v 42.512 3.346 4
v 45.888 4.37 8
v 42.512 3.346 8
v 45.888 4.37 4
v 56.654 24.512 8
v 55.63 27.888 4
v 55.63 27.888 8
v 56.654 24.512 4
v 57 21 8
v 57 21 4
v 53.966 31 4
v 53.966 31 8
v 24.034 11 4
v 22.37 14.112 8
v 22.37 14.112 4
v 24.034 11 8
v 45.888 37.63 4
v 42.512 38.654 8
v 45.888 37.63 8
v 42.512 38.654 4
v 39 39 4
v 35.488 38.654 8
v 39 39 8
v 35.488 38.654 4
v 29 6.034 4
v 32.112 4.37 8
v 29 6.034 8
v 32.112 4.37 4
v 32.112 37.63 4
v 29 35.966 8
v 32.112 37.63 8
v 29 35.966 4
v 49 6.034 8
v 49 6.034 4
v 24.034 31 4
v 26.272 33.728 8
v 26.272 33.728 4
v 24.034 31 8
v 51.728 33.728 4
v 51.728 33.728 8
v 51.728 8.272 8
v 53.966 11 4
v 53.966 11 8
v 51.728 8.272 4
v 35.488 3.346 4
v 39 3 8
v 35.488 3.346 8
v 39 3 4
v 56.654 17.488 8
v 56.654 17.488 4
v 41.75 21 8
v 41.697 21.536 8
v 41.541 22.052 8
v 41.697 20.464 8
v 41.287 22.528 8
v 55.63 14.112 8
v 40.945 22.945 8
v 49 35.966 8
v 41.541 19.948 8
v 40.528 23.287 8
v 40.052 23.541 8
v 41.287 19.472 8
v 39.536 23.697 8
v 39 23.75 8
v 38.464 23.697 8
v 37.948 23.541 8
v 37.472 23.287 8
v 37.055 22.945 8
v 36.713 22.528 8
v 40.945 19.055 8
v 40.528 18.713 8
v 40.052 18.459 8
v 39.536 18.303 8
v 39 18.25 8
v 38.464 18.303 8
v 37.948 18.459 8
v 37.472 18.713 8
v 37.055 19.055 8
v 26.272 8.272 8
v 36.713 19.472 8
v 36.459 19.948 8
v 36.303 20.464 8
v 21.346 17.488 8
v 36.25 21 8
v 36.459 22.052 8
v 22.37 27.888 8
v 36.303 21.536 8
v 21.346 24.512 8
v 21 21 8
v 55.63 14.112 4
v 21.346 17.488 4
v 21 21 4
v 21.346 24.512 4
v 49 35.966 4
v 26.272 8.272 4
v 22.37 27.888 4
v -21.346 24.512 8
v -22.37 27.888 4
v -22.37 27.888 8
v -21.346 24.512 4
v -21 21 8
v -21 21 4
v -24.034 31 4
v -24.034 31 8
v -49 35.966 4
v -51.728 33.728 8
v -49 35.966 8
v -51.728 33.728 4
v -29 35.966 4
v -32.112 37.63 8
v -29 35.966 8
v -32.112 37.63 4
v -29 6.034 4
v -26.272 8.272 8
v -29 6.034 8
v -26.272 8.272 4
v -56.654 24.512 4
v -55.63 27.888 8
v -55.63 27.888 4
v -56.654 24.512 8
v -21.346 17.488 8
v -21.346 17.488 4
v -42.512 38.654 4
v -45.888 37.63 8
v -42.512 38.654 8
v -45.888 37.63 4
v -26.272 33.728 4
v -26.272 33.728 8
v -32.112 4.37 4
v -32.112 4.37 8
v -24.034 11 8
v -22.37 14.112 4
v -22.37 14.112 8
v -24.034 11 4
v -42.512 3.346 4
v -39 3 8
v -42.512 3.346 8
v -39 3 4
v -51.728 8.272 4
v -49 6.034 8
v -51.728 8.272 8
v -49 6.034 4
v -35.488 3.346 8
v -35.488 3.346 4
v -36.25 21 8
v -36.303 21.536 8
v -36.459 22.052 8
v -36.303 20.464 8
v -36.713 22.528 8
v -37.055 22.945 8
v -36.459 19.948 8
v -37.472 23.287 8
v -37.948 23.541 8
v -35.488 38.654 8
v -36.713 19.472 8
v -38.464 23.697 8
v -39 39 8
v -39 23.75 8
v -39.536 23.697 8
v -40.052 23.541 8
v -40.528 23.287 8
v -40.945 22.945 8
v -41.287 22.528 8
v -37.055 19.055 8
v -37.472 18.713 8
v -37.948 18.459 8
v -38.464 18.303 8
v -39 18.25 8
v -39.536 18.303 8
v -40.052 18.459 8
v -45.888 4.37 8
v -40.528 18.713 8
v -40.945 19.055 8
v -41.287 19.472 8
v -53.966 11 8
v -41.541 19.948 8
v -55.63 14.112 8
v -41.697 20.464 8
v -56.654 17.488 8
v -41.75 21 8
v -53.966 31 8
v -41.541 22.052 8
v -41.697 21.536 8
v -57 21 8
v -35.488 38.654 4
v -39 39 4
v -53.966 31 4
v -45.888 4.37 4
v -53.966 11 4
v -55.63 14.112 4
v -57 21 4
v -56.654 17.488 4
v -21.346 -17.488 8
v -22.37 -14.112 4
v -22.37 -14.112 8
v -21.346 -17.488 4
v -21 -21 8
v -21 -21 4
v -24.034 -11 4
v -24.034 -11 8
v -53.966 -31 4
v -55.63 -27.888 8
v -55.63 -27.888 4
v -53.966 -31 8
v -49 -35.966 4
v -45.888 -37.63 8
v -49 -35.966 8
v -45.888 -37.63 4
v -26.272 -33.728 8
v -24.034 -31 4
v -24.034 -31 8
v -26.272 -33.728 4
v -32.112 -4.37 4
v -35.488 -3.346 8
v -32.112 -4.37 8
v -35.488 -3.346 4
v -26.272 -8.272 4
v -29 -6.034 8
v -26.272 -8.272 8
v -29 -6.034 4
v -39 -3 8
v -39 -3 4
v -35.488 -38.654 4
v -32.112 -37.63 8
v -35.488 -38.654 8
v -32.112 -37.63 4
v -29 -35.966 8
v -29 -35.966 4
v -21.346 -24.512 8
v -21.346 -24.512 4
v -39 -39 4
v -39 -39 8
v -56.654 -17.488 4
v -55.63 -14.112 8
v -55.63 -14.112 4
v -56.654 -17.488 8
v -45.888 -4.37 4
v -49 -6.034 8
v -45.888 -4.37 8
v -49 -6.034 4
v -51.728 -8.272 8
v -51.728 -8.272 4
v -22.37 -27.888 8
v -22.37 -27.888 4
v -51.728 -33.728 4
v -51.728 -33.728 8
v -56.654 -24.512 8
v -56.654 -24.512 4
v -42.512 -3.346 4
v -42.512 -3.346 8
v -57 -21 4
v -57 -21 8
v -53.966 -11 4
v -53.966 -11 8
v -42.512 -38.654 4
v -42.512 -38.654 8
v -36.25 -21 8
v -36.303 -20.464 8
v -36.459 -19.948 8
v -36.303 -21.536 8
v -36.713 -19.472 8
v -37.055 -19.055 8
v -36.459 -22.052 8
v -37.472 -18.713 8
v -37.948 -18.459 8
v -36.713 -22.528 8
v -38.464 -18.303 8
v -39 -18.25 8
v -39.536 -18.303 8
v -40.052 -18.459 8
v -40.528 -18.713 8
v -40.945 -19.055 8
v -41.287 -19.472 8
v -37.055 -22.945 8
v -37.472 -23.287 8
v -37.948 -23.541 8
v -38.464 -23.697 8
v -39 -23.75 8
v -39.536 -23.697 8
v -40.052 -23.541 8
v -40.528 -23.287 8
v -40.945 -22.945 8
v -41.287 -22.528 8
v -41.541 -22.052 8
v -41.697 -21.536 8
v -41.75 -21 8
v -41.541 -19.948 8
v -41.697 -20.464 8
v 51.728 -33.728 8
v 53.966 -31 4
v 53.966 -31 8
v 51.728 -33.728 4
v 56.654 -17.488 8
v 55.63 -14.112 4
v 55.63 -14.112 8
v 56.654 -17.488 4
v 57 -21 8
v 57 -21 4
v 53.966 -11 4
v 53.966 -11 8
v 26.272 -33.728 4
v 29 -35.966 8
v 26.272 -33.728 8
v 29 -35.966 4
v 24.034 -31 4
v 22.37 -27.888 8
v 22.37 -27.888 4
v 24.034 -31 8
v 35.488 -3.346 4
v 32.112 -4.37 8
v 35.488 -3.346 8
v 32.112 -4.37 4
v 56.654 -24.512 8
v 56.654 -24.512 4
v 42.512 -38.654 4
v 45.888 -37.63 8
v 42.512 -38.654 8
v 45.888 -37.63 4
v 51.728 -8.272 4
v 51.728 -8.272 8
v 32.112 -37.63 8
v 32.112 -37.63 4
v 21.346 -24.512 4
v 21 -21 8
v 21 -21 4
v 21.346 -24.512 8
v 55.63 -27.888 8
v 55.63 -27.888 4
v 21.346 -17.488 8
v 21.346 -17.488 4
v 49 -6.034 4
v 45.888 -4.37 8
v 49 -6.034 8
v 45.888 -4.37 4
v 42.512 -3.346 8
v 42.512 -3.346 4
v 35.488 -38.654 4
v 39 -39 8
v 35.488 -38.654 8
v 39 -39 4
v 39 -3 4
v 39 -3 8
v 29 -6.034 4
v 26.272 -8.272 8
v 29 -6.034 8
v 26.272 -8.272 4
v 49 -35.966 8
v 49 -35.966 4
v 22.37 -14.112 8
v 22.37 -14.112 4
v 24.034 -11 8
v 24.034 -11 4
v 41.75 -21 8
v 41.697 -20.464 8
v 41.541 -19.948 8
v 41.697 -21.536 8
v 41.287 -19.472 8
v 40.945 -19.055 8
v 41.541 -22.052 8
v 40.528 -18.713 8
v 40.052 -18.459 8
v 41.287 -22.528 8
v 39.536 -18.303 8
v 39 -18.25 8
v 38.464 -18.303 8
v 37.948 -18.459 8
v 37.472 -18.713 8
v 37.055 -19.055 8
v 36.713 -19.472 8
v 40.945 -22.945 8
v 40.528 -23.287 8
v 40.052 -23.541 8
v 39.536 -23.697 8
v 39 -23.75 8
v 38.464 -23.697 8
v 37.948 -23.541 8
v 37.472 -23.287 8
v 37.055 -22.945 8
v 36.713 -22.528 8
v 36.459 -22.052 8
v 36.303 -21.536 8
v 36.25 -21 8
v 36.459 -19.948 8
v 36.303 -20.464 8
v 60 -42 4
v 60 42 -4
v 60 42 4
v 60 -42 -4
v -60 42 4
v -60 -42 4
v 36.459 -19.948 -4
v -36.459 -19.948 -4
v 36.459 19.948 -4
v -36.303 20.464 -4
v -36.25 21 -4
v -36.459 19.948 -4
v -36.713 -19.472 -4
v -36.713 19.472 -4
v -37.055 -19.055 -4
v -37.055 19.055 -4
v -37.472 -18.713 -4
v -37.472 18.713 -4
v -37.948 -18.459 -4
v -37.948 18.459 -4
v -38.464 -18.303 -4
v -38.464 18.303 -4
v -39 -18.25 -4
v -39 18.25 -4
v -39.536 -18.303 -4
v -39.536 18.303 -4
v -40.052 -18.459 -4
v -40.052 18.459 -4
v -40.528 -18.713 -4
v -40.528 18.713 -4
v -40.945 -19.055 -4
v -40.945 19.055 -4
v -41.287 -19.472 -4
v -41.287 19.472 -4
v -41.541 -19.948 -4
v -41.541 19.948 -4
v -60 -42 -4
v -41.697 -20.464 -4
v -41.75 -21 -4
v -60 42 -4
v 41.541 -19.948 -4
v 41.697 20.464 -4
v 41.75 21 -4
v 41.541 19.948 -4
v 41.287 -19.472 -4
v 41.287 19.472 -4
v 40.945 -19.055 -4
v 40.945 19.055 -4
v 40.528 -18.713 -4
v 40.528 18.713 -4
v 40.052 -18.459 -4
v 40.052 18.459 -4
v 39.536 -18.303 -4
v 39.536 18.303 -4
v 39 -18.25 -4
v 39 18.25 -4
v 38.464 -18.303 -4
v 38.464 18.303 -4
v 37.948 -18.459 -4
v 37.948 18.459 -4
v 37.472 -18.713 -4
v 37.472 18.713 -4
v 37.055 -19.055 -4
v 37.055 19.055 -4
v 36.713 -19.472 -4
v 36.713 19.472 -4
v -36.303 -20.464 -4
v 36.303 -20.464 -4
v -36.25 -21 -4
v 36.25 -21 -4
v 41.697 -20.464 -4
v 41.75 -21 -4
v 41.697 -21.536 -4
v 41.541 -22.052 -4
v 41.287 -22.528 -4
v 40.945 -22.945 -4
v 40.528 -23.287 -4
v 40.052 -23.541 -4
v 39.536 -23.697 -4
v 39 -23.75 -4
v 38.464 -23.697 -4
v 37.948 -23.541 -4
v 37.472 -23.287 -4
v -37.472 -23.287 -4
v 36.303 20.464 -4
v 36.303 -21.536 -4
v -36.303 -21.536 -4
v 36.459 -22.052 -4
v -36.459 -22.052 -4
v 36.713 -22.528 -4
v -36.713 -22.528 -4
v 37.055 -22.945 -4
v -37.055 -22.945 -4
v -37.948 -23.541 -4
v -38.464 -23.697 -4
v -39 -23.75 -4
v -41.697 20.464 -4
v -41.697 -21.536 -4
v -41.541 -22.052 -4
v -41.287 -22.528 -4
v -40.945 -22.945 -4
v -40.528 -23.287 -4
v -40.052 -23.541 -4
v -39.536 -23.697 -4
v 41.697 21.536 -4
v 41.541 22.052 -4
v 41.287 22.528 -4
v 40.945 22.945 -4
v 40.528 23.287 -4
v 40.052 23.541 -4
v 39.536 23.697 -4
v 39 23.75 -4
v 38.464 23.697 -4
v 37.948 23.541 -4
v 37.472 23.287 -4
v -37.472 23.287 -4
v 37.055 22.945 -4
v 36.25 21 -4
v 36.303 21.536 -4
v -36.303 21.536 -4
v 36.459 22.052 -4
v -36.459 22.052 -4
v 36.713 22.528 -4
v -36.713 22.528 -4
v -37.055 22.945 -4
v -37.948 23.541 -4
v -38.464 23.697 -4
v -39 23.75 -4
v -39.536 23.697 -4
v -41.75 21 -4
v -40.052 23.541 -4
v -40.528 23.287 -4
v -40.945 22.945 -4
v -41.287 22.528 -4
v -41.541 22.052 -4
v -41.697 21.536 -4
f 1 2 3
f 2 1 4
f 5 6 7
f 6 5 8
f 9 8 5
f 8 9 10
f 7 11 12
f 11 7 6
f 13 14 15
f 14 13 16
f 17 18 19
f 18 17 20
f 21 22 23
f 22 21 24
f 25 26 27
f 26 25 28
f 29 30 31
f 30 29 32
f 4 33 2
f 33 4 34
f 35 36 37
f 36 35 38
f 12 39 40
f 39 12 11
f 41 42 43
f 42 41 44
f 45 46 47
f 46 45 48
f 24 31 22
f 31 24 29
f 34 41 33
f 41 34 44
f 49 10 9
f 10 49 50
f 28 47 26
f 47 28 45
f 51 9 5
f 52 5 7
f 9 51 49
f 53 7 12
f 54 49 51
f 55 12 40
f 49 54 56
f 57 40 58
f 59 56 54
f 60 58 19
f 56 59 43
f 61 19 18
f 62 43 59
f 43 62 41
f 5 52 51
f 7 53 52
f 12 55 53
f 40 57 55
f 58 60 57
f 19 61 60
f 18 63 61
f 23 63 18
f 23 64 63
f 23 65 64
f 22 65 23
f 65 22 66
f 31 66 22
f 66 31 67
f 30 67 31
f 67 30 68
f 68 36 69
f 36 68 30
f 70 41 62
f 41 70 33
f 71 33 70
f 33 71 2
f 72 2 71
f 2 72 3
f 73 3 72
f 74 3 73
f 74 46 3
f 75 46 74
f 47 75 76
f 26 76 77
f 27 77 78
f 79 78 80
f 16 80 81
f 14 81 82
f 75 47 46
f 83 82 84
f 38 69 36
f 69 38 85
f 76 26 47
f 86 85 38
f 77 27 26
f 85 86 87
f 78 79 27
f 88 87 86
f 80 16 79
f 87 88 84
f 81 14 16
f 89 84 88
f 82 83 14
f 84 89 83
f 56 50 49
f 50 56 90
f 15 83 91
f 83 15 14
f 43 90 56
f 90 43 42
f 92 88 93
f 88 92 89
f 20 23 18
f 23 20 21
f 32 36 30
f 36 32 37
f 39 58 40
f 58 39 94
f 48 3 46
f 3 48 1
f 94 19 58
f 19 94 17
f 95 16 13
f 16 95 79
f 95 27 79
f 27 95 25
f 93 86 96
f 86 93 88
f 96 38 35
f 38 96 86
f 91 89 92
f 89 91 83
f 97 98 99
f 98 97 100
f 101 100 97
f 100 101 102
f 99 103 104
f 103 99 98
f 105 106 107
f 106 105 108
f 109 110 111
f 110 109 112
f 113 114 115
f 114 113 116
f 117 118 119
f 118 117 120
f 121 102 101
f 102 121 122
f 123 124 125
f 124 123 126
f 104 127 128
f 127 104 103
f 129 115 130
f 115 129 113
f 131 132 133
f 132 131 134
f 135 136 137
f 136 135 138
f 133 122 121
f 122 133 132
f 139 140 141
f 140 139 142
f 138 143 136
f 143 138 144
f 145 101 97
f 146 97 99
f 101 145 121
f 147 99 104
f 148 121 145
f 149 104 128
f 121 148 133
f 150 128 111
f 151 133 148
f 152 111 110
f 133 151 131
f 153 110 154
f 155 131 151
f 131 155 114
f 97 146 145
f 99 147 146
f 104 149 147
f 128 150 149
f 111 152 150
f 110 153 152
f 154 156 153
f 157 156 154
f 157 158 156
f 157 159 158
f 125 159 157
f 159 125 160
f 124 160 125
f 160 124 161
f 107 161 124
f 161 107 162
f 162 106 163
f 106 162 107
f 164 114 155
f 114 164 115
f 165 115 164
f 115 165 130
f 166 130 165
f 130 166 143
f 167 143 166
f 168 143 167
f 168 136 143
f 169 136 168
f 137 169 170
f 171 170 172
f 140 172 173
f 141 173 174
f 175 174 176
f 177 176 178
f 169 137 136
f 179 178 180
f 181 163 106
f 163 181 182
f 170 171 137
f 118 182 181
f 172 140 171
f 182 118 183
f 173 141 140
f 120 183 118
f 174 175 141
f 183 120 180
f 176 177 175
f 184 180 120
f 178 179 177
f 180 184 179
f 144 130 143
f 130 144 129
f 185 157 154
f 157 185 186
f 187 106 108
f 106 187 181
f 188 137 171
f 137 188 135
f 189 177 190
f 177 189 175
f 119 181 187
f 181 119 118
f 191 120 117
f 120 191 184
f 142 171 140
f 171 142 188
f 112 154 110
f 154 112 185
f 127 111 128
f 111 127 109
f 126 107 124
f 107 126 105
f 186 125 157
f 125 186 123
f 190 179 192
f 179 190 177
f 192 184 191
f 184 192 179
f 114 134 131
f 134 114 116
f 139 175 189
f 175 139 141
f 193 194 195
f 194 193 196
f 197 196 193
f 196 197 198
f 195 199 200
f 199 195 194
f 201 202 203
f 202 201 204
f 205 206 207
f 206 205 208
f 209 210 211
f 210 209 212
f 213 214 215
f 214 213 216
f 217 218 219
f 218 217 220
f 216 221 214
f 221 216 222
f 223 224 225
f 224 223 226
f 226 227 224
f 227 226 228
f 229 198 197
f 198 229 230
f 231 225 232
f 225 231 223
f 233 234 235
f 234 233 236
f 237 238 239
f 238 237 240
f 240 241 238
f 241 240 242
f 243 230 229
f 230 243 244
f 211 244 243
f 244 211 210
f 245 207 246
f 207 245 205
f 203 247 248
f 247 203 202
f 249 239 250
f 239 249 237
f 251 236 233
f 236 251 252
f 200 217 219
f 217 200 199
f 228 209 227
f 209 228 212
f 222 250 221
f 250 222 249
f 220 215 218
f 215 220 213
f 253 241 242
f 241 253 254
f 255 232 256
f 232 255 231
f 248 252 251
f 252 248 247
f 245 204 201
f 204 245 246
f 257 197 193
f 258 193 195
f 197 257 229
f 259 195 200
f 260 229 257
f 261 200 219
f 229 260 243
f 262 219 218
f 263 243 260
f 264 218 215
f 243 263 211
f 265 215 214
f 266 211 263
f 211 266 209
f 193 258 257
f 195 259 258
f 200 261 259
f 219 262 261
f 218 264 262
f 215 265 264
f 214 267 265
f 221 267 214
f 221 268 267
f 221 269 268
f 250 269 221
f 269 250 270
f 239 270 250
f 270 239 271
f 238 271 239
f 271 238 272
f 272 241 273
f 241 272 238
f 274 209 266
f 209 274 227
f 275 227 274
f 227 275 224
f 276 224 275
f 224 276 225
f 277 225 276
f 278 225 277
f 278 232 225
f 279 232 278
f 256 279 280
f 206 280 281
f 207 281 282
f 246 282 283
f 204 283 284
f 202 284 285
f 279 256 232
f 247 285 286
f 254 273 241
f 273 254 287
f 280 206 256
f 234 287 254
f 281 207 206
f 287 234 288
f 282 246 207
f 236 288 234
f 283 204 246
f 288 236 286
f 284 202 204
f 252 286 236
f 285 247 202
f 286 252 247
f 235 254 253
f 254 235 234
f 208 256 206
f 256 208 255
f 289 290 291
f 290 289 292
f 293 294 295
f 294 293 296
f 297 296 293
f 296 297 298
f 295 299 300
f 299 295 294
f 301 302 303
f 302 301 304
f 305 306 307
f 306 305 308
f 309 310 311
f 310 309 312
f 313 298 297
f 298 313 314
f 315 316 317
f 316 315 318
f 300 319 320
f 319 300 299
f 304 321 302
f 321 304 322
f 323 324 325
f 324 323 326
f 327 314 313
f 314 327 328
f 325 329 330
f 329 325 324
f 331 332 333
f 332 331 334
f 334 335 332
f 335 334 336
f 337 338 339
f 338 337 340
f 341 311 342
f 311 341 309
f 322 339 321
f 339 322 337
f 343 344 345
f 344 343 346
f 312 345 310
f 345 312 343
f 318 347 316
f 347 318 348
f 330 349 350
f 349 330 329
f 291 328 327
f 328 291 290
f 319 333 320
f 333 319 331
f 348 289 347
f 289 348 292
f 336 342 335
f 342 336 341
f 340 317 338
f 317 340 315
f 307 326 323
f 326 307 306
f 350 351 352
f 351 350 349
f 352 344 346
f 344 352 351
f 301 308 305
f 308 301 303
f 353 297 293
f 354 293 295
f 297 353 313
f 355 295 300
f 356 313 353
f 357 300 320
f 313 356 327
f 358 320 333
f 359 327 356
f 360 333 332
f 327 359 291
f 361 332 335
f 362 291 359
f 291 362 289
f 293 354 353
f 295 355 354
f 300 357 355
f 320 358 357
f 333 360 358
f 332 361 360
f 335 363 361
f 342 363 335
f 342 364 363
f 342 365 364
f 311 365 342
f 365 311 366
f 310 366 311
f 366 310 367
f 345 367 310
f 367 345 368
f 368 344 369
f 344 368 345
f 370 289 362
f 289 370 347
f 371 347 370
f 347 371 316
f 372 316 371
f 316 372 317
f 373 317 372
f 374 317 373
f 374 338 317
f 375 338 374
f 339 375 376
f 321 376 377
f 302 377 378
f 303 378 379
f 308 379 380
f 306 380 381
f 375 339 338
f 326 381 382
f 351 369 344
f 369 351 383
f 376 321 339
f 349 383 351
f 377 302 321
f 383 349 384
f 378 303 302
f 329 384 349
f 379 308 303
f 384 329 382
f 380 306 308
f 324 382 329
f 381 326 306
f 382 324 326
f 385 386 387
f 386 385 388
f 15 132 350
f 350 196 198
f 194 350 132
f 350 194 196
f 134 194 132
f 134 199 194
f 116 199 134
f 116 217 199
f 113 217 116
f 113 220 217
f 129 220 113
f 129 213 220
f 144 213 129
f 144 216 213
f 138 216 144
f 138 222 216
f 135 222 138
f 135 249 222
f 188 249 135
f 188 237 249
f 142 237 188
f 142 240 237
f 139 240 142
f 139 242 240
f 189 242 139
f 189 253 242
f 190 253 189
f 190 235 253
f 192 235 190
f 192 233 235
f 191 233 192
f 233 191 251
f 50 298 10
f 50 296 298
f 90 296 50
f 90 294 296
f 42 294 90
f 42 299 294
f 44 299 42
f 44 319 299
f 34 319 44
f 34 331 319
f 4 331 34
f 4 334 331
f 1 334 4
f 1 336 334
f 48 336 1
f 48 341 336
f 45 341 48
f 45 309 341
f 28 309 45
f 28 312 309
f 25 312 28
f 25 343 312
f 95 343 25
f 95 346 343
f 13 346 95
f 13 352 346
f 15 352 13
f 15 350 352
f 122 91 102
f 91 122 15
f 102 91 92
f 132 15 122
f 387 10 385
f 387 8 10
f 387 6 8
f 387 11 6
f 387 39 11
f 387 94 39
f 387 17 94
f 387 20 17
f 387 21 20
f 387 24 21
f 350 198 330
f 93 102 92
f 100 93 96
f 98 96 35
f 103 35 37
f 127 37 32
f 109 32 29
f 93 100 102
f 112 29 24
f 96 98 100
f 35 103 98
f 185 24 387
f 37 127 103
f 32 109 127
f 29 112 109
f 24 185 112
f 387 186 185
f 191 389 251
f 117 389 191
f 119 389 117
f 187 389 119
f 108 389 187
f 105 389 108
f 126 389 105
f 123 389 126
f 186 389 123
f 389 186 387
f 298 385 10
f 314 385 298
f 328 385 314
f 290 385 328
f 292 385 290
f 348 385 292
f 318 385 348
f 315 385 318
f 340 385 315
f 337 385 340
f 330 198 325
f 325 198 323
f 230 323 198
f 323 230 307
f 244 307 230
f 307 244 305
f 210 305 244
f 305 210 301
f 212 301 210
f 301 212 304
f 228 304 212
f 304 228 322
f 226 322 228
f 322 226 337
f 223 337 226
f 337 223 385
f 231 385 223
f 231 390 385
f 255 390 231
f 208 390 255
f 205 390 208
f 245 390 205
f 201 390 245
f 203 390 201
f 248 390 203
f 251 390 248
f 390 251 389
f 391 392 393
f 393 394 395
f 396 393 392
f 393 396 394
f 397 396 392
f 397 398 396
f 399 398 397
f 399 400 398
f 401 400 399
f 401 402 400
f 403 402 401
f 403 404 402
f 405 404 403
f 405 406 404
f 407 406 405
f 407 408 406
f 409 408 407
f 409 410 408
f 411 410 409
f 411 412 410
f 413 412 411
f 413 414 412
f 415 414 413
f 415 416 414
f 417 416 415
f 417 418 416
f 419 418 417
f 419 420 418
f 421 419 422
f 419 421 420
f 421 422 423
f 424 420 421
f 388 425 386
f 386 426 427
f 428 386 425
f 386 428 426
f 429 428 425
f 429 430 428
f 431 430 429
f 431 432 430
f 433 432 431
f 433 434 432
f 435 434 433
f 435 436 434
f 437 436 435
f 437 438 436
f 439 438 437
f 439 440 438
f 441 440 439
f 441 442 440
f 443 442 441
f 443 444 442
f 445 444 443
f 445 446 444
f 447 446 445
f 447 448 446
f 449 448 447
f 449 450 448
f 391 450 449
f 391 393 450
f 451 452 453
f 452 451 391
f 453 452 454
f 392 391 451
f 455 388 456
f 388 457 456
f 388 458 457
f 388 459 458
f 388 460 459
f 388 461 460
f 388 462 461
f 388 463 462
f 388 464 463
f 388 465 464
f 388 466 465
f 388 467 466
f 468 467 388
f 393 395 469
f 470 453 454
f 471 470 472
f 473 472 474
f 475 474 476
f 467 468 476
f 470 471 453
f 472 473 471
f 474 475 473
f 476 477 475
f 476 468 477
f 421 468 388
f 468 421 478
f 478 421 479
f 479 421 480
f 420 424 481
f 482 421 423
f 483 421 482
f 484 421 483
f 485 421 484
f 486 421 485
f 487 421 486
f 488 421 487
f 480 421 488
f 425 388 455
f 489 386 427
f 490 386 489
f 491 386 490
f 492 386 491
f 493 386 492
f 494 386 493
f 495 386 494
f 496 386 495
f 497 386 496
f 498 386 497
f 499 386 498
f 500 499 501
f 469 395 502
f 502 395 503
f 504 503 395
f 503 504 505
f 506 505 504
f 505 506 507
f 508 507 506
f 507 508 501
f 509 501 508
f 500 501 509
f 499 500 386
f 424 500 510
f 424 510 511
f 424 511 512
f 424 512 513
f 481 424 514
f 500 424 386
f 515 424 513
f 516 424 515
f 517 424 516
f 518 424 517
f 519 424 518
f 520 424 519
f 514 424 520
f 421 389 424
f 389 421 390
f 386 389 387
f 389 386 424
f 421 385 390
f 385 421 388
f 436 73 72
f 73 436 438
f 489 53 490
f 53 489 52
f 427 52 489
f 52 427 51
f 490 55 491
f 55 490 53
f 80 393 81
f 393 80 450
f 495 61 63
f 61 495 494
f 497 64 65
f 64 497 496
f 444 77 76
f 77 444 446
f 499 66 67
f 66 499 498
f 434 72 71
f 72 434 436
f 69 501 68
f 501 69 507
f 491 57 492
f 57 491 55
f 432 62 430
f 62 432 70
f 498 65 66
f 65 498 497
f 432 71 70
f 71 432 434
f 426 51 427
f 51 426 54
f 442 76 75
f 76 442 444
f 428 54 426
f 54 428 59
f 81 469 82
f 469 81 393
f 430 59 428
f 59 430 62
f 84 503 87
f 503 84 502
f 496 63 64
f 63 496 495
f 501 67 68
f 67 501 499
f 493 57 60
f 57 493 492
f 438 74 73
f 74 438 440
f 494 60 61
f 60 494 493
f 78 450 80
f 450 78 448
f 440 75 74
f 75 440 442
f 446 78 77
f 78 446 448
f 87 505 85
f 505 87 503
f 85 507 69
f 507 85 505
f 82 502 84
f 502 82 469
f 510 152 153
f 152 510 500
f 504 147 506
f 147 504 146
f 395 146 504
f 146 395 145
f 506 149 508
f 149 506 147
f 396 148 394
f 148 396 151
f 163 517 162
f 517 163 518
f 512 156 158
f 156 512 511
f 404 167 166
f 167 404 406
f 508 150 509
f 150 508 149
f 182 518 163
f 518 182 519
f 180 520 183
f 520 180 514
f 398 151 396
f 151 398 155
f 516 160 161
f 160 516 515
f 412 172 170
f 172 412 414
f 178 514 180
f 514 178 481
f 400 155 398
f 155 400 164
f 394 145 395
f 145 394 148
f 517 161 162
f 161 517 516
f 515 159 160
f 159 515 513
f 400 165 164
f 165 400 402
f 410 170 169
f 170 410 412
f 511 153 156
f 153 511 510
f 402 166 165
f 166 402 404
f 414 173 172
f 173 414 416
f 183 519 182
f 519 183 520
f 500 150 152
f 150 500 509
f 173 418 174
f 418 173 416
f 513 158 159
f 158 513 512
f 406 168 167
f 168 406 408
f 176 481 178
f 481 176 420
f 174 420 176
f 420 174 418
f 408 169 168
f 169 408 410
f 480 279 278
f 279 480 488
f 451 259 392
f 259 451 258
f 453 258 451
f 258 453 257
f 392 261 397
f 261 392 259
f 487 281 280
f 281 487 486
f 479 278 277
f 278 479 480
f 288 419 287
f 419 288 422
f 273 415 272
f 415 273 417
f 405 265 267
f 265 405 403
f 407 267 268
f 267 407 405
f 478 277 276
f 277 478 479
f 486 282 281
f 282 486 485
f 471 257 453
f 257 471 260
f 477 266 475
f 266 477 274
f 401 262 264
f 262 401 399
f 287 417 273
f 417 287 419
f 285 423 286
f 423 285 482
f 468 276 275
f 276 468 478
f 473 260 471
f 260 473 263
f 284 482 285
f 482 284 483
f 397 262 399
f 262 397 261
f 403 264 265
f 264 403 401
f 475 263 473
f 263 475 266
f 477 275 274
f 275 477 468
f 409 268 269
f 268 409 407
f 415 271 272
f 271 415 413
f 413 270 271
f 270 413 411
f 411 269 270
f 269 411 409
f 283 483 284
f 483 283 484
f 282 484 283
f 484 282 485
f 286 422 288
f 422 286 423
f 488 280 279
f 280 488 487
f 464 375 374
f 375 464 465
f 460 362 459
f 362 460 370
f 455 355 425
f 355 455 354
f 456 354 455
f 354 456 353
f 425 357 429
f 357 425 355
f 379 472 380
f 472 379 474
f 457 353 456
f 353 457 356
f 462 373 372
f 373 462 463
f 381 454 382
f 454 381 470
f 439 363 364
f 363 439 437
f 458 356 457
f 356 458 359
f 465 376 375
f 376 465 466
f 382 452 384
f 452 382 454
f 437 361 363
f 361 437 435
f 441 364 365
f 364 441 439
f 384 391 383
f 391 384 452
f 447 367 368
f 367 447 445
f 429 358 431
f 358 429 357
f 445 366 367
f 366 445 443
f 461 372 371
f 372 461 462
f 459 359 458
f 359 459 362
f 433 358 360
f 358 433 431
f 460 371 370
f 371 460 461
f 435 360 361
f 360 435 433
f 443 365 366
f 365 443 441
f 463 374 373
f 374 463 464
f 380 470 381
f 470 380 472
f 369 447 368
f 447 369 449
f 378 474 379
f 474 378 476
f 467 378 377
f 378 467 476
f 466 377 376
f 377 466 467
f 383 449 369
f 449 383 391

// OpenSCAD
$fn = 32;

// ----------------------------------------------------------------------
// Anchor pads 120 x 84 x 12
// four corner bosses with anchor holes
// ----------------------------------------------------------------------

// --- parameters (mm) ---
plate = [120, 84, 8];  // base plate size (x, y, z)
pads = 4;              // boss count, one per corner
edge = 21;             // boss centre offset from the plate edge
boss_d = 36;           // boss diameter
boss_h = 4;            // boss height above the base plate
hole_d = 5.5;          // hole diameter

// --- derived feature positions (mm) ---
height = plate[2] + boss_h;      // = 12   overall height of the part
corner_x = plate[0] / 2 - edge;  // = 39   boss centre X
corner_y = plate[1] / 2 - edge;  // = 21   boss centre Y
feature_centers = [
  [corner_x, corner_y],
  [-corner_x, corner_y],
  [-corner_x, -corner_y],
  [corner_x, -corner_y]
];   // boss centres, anchor holes are drilled there

// base plate, four bosses standing on it, anchor holes all the way through
difference() {
  union() {
    cube(plate, center = true);
    for (centre = feature_centers)
      translate([centre[0], centre[1], plate[2] / 2 - 1])
        cylinder(d = boss_d, h = boss_h + 1);
  }
  for (centre = feature_centers)
    translate([centre[0], centre[1], -height])
      cylinder(d = hole_d, h = 2 * height + 2);  // through boss and plate
}
